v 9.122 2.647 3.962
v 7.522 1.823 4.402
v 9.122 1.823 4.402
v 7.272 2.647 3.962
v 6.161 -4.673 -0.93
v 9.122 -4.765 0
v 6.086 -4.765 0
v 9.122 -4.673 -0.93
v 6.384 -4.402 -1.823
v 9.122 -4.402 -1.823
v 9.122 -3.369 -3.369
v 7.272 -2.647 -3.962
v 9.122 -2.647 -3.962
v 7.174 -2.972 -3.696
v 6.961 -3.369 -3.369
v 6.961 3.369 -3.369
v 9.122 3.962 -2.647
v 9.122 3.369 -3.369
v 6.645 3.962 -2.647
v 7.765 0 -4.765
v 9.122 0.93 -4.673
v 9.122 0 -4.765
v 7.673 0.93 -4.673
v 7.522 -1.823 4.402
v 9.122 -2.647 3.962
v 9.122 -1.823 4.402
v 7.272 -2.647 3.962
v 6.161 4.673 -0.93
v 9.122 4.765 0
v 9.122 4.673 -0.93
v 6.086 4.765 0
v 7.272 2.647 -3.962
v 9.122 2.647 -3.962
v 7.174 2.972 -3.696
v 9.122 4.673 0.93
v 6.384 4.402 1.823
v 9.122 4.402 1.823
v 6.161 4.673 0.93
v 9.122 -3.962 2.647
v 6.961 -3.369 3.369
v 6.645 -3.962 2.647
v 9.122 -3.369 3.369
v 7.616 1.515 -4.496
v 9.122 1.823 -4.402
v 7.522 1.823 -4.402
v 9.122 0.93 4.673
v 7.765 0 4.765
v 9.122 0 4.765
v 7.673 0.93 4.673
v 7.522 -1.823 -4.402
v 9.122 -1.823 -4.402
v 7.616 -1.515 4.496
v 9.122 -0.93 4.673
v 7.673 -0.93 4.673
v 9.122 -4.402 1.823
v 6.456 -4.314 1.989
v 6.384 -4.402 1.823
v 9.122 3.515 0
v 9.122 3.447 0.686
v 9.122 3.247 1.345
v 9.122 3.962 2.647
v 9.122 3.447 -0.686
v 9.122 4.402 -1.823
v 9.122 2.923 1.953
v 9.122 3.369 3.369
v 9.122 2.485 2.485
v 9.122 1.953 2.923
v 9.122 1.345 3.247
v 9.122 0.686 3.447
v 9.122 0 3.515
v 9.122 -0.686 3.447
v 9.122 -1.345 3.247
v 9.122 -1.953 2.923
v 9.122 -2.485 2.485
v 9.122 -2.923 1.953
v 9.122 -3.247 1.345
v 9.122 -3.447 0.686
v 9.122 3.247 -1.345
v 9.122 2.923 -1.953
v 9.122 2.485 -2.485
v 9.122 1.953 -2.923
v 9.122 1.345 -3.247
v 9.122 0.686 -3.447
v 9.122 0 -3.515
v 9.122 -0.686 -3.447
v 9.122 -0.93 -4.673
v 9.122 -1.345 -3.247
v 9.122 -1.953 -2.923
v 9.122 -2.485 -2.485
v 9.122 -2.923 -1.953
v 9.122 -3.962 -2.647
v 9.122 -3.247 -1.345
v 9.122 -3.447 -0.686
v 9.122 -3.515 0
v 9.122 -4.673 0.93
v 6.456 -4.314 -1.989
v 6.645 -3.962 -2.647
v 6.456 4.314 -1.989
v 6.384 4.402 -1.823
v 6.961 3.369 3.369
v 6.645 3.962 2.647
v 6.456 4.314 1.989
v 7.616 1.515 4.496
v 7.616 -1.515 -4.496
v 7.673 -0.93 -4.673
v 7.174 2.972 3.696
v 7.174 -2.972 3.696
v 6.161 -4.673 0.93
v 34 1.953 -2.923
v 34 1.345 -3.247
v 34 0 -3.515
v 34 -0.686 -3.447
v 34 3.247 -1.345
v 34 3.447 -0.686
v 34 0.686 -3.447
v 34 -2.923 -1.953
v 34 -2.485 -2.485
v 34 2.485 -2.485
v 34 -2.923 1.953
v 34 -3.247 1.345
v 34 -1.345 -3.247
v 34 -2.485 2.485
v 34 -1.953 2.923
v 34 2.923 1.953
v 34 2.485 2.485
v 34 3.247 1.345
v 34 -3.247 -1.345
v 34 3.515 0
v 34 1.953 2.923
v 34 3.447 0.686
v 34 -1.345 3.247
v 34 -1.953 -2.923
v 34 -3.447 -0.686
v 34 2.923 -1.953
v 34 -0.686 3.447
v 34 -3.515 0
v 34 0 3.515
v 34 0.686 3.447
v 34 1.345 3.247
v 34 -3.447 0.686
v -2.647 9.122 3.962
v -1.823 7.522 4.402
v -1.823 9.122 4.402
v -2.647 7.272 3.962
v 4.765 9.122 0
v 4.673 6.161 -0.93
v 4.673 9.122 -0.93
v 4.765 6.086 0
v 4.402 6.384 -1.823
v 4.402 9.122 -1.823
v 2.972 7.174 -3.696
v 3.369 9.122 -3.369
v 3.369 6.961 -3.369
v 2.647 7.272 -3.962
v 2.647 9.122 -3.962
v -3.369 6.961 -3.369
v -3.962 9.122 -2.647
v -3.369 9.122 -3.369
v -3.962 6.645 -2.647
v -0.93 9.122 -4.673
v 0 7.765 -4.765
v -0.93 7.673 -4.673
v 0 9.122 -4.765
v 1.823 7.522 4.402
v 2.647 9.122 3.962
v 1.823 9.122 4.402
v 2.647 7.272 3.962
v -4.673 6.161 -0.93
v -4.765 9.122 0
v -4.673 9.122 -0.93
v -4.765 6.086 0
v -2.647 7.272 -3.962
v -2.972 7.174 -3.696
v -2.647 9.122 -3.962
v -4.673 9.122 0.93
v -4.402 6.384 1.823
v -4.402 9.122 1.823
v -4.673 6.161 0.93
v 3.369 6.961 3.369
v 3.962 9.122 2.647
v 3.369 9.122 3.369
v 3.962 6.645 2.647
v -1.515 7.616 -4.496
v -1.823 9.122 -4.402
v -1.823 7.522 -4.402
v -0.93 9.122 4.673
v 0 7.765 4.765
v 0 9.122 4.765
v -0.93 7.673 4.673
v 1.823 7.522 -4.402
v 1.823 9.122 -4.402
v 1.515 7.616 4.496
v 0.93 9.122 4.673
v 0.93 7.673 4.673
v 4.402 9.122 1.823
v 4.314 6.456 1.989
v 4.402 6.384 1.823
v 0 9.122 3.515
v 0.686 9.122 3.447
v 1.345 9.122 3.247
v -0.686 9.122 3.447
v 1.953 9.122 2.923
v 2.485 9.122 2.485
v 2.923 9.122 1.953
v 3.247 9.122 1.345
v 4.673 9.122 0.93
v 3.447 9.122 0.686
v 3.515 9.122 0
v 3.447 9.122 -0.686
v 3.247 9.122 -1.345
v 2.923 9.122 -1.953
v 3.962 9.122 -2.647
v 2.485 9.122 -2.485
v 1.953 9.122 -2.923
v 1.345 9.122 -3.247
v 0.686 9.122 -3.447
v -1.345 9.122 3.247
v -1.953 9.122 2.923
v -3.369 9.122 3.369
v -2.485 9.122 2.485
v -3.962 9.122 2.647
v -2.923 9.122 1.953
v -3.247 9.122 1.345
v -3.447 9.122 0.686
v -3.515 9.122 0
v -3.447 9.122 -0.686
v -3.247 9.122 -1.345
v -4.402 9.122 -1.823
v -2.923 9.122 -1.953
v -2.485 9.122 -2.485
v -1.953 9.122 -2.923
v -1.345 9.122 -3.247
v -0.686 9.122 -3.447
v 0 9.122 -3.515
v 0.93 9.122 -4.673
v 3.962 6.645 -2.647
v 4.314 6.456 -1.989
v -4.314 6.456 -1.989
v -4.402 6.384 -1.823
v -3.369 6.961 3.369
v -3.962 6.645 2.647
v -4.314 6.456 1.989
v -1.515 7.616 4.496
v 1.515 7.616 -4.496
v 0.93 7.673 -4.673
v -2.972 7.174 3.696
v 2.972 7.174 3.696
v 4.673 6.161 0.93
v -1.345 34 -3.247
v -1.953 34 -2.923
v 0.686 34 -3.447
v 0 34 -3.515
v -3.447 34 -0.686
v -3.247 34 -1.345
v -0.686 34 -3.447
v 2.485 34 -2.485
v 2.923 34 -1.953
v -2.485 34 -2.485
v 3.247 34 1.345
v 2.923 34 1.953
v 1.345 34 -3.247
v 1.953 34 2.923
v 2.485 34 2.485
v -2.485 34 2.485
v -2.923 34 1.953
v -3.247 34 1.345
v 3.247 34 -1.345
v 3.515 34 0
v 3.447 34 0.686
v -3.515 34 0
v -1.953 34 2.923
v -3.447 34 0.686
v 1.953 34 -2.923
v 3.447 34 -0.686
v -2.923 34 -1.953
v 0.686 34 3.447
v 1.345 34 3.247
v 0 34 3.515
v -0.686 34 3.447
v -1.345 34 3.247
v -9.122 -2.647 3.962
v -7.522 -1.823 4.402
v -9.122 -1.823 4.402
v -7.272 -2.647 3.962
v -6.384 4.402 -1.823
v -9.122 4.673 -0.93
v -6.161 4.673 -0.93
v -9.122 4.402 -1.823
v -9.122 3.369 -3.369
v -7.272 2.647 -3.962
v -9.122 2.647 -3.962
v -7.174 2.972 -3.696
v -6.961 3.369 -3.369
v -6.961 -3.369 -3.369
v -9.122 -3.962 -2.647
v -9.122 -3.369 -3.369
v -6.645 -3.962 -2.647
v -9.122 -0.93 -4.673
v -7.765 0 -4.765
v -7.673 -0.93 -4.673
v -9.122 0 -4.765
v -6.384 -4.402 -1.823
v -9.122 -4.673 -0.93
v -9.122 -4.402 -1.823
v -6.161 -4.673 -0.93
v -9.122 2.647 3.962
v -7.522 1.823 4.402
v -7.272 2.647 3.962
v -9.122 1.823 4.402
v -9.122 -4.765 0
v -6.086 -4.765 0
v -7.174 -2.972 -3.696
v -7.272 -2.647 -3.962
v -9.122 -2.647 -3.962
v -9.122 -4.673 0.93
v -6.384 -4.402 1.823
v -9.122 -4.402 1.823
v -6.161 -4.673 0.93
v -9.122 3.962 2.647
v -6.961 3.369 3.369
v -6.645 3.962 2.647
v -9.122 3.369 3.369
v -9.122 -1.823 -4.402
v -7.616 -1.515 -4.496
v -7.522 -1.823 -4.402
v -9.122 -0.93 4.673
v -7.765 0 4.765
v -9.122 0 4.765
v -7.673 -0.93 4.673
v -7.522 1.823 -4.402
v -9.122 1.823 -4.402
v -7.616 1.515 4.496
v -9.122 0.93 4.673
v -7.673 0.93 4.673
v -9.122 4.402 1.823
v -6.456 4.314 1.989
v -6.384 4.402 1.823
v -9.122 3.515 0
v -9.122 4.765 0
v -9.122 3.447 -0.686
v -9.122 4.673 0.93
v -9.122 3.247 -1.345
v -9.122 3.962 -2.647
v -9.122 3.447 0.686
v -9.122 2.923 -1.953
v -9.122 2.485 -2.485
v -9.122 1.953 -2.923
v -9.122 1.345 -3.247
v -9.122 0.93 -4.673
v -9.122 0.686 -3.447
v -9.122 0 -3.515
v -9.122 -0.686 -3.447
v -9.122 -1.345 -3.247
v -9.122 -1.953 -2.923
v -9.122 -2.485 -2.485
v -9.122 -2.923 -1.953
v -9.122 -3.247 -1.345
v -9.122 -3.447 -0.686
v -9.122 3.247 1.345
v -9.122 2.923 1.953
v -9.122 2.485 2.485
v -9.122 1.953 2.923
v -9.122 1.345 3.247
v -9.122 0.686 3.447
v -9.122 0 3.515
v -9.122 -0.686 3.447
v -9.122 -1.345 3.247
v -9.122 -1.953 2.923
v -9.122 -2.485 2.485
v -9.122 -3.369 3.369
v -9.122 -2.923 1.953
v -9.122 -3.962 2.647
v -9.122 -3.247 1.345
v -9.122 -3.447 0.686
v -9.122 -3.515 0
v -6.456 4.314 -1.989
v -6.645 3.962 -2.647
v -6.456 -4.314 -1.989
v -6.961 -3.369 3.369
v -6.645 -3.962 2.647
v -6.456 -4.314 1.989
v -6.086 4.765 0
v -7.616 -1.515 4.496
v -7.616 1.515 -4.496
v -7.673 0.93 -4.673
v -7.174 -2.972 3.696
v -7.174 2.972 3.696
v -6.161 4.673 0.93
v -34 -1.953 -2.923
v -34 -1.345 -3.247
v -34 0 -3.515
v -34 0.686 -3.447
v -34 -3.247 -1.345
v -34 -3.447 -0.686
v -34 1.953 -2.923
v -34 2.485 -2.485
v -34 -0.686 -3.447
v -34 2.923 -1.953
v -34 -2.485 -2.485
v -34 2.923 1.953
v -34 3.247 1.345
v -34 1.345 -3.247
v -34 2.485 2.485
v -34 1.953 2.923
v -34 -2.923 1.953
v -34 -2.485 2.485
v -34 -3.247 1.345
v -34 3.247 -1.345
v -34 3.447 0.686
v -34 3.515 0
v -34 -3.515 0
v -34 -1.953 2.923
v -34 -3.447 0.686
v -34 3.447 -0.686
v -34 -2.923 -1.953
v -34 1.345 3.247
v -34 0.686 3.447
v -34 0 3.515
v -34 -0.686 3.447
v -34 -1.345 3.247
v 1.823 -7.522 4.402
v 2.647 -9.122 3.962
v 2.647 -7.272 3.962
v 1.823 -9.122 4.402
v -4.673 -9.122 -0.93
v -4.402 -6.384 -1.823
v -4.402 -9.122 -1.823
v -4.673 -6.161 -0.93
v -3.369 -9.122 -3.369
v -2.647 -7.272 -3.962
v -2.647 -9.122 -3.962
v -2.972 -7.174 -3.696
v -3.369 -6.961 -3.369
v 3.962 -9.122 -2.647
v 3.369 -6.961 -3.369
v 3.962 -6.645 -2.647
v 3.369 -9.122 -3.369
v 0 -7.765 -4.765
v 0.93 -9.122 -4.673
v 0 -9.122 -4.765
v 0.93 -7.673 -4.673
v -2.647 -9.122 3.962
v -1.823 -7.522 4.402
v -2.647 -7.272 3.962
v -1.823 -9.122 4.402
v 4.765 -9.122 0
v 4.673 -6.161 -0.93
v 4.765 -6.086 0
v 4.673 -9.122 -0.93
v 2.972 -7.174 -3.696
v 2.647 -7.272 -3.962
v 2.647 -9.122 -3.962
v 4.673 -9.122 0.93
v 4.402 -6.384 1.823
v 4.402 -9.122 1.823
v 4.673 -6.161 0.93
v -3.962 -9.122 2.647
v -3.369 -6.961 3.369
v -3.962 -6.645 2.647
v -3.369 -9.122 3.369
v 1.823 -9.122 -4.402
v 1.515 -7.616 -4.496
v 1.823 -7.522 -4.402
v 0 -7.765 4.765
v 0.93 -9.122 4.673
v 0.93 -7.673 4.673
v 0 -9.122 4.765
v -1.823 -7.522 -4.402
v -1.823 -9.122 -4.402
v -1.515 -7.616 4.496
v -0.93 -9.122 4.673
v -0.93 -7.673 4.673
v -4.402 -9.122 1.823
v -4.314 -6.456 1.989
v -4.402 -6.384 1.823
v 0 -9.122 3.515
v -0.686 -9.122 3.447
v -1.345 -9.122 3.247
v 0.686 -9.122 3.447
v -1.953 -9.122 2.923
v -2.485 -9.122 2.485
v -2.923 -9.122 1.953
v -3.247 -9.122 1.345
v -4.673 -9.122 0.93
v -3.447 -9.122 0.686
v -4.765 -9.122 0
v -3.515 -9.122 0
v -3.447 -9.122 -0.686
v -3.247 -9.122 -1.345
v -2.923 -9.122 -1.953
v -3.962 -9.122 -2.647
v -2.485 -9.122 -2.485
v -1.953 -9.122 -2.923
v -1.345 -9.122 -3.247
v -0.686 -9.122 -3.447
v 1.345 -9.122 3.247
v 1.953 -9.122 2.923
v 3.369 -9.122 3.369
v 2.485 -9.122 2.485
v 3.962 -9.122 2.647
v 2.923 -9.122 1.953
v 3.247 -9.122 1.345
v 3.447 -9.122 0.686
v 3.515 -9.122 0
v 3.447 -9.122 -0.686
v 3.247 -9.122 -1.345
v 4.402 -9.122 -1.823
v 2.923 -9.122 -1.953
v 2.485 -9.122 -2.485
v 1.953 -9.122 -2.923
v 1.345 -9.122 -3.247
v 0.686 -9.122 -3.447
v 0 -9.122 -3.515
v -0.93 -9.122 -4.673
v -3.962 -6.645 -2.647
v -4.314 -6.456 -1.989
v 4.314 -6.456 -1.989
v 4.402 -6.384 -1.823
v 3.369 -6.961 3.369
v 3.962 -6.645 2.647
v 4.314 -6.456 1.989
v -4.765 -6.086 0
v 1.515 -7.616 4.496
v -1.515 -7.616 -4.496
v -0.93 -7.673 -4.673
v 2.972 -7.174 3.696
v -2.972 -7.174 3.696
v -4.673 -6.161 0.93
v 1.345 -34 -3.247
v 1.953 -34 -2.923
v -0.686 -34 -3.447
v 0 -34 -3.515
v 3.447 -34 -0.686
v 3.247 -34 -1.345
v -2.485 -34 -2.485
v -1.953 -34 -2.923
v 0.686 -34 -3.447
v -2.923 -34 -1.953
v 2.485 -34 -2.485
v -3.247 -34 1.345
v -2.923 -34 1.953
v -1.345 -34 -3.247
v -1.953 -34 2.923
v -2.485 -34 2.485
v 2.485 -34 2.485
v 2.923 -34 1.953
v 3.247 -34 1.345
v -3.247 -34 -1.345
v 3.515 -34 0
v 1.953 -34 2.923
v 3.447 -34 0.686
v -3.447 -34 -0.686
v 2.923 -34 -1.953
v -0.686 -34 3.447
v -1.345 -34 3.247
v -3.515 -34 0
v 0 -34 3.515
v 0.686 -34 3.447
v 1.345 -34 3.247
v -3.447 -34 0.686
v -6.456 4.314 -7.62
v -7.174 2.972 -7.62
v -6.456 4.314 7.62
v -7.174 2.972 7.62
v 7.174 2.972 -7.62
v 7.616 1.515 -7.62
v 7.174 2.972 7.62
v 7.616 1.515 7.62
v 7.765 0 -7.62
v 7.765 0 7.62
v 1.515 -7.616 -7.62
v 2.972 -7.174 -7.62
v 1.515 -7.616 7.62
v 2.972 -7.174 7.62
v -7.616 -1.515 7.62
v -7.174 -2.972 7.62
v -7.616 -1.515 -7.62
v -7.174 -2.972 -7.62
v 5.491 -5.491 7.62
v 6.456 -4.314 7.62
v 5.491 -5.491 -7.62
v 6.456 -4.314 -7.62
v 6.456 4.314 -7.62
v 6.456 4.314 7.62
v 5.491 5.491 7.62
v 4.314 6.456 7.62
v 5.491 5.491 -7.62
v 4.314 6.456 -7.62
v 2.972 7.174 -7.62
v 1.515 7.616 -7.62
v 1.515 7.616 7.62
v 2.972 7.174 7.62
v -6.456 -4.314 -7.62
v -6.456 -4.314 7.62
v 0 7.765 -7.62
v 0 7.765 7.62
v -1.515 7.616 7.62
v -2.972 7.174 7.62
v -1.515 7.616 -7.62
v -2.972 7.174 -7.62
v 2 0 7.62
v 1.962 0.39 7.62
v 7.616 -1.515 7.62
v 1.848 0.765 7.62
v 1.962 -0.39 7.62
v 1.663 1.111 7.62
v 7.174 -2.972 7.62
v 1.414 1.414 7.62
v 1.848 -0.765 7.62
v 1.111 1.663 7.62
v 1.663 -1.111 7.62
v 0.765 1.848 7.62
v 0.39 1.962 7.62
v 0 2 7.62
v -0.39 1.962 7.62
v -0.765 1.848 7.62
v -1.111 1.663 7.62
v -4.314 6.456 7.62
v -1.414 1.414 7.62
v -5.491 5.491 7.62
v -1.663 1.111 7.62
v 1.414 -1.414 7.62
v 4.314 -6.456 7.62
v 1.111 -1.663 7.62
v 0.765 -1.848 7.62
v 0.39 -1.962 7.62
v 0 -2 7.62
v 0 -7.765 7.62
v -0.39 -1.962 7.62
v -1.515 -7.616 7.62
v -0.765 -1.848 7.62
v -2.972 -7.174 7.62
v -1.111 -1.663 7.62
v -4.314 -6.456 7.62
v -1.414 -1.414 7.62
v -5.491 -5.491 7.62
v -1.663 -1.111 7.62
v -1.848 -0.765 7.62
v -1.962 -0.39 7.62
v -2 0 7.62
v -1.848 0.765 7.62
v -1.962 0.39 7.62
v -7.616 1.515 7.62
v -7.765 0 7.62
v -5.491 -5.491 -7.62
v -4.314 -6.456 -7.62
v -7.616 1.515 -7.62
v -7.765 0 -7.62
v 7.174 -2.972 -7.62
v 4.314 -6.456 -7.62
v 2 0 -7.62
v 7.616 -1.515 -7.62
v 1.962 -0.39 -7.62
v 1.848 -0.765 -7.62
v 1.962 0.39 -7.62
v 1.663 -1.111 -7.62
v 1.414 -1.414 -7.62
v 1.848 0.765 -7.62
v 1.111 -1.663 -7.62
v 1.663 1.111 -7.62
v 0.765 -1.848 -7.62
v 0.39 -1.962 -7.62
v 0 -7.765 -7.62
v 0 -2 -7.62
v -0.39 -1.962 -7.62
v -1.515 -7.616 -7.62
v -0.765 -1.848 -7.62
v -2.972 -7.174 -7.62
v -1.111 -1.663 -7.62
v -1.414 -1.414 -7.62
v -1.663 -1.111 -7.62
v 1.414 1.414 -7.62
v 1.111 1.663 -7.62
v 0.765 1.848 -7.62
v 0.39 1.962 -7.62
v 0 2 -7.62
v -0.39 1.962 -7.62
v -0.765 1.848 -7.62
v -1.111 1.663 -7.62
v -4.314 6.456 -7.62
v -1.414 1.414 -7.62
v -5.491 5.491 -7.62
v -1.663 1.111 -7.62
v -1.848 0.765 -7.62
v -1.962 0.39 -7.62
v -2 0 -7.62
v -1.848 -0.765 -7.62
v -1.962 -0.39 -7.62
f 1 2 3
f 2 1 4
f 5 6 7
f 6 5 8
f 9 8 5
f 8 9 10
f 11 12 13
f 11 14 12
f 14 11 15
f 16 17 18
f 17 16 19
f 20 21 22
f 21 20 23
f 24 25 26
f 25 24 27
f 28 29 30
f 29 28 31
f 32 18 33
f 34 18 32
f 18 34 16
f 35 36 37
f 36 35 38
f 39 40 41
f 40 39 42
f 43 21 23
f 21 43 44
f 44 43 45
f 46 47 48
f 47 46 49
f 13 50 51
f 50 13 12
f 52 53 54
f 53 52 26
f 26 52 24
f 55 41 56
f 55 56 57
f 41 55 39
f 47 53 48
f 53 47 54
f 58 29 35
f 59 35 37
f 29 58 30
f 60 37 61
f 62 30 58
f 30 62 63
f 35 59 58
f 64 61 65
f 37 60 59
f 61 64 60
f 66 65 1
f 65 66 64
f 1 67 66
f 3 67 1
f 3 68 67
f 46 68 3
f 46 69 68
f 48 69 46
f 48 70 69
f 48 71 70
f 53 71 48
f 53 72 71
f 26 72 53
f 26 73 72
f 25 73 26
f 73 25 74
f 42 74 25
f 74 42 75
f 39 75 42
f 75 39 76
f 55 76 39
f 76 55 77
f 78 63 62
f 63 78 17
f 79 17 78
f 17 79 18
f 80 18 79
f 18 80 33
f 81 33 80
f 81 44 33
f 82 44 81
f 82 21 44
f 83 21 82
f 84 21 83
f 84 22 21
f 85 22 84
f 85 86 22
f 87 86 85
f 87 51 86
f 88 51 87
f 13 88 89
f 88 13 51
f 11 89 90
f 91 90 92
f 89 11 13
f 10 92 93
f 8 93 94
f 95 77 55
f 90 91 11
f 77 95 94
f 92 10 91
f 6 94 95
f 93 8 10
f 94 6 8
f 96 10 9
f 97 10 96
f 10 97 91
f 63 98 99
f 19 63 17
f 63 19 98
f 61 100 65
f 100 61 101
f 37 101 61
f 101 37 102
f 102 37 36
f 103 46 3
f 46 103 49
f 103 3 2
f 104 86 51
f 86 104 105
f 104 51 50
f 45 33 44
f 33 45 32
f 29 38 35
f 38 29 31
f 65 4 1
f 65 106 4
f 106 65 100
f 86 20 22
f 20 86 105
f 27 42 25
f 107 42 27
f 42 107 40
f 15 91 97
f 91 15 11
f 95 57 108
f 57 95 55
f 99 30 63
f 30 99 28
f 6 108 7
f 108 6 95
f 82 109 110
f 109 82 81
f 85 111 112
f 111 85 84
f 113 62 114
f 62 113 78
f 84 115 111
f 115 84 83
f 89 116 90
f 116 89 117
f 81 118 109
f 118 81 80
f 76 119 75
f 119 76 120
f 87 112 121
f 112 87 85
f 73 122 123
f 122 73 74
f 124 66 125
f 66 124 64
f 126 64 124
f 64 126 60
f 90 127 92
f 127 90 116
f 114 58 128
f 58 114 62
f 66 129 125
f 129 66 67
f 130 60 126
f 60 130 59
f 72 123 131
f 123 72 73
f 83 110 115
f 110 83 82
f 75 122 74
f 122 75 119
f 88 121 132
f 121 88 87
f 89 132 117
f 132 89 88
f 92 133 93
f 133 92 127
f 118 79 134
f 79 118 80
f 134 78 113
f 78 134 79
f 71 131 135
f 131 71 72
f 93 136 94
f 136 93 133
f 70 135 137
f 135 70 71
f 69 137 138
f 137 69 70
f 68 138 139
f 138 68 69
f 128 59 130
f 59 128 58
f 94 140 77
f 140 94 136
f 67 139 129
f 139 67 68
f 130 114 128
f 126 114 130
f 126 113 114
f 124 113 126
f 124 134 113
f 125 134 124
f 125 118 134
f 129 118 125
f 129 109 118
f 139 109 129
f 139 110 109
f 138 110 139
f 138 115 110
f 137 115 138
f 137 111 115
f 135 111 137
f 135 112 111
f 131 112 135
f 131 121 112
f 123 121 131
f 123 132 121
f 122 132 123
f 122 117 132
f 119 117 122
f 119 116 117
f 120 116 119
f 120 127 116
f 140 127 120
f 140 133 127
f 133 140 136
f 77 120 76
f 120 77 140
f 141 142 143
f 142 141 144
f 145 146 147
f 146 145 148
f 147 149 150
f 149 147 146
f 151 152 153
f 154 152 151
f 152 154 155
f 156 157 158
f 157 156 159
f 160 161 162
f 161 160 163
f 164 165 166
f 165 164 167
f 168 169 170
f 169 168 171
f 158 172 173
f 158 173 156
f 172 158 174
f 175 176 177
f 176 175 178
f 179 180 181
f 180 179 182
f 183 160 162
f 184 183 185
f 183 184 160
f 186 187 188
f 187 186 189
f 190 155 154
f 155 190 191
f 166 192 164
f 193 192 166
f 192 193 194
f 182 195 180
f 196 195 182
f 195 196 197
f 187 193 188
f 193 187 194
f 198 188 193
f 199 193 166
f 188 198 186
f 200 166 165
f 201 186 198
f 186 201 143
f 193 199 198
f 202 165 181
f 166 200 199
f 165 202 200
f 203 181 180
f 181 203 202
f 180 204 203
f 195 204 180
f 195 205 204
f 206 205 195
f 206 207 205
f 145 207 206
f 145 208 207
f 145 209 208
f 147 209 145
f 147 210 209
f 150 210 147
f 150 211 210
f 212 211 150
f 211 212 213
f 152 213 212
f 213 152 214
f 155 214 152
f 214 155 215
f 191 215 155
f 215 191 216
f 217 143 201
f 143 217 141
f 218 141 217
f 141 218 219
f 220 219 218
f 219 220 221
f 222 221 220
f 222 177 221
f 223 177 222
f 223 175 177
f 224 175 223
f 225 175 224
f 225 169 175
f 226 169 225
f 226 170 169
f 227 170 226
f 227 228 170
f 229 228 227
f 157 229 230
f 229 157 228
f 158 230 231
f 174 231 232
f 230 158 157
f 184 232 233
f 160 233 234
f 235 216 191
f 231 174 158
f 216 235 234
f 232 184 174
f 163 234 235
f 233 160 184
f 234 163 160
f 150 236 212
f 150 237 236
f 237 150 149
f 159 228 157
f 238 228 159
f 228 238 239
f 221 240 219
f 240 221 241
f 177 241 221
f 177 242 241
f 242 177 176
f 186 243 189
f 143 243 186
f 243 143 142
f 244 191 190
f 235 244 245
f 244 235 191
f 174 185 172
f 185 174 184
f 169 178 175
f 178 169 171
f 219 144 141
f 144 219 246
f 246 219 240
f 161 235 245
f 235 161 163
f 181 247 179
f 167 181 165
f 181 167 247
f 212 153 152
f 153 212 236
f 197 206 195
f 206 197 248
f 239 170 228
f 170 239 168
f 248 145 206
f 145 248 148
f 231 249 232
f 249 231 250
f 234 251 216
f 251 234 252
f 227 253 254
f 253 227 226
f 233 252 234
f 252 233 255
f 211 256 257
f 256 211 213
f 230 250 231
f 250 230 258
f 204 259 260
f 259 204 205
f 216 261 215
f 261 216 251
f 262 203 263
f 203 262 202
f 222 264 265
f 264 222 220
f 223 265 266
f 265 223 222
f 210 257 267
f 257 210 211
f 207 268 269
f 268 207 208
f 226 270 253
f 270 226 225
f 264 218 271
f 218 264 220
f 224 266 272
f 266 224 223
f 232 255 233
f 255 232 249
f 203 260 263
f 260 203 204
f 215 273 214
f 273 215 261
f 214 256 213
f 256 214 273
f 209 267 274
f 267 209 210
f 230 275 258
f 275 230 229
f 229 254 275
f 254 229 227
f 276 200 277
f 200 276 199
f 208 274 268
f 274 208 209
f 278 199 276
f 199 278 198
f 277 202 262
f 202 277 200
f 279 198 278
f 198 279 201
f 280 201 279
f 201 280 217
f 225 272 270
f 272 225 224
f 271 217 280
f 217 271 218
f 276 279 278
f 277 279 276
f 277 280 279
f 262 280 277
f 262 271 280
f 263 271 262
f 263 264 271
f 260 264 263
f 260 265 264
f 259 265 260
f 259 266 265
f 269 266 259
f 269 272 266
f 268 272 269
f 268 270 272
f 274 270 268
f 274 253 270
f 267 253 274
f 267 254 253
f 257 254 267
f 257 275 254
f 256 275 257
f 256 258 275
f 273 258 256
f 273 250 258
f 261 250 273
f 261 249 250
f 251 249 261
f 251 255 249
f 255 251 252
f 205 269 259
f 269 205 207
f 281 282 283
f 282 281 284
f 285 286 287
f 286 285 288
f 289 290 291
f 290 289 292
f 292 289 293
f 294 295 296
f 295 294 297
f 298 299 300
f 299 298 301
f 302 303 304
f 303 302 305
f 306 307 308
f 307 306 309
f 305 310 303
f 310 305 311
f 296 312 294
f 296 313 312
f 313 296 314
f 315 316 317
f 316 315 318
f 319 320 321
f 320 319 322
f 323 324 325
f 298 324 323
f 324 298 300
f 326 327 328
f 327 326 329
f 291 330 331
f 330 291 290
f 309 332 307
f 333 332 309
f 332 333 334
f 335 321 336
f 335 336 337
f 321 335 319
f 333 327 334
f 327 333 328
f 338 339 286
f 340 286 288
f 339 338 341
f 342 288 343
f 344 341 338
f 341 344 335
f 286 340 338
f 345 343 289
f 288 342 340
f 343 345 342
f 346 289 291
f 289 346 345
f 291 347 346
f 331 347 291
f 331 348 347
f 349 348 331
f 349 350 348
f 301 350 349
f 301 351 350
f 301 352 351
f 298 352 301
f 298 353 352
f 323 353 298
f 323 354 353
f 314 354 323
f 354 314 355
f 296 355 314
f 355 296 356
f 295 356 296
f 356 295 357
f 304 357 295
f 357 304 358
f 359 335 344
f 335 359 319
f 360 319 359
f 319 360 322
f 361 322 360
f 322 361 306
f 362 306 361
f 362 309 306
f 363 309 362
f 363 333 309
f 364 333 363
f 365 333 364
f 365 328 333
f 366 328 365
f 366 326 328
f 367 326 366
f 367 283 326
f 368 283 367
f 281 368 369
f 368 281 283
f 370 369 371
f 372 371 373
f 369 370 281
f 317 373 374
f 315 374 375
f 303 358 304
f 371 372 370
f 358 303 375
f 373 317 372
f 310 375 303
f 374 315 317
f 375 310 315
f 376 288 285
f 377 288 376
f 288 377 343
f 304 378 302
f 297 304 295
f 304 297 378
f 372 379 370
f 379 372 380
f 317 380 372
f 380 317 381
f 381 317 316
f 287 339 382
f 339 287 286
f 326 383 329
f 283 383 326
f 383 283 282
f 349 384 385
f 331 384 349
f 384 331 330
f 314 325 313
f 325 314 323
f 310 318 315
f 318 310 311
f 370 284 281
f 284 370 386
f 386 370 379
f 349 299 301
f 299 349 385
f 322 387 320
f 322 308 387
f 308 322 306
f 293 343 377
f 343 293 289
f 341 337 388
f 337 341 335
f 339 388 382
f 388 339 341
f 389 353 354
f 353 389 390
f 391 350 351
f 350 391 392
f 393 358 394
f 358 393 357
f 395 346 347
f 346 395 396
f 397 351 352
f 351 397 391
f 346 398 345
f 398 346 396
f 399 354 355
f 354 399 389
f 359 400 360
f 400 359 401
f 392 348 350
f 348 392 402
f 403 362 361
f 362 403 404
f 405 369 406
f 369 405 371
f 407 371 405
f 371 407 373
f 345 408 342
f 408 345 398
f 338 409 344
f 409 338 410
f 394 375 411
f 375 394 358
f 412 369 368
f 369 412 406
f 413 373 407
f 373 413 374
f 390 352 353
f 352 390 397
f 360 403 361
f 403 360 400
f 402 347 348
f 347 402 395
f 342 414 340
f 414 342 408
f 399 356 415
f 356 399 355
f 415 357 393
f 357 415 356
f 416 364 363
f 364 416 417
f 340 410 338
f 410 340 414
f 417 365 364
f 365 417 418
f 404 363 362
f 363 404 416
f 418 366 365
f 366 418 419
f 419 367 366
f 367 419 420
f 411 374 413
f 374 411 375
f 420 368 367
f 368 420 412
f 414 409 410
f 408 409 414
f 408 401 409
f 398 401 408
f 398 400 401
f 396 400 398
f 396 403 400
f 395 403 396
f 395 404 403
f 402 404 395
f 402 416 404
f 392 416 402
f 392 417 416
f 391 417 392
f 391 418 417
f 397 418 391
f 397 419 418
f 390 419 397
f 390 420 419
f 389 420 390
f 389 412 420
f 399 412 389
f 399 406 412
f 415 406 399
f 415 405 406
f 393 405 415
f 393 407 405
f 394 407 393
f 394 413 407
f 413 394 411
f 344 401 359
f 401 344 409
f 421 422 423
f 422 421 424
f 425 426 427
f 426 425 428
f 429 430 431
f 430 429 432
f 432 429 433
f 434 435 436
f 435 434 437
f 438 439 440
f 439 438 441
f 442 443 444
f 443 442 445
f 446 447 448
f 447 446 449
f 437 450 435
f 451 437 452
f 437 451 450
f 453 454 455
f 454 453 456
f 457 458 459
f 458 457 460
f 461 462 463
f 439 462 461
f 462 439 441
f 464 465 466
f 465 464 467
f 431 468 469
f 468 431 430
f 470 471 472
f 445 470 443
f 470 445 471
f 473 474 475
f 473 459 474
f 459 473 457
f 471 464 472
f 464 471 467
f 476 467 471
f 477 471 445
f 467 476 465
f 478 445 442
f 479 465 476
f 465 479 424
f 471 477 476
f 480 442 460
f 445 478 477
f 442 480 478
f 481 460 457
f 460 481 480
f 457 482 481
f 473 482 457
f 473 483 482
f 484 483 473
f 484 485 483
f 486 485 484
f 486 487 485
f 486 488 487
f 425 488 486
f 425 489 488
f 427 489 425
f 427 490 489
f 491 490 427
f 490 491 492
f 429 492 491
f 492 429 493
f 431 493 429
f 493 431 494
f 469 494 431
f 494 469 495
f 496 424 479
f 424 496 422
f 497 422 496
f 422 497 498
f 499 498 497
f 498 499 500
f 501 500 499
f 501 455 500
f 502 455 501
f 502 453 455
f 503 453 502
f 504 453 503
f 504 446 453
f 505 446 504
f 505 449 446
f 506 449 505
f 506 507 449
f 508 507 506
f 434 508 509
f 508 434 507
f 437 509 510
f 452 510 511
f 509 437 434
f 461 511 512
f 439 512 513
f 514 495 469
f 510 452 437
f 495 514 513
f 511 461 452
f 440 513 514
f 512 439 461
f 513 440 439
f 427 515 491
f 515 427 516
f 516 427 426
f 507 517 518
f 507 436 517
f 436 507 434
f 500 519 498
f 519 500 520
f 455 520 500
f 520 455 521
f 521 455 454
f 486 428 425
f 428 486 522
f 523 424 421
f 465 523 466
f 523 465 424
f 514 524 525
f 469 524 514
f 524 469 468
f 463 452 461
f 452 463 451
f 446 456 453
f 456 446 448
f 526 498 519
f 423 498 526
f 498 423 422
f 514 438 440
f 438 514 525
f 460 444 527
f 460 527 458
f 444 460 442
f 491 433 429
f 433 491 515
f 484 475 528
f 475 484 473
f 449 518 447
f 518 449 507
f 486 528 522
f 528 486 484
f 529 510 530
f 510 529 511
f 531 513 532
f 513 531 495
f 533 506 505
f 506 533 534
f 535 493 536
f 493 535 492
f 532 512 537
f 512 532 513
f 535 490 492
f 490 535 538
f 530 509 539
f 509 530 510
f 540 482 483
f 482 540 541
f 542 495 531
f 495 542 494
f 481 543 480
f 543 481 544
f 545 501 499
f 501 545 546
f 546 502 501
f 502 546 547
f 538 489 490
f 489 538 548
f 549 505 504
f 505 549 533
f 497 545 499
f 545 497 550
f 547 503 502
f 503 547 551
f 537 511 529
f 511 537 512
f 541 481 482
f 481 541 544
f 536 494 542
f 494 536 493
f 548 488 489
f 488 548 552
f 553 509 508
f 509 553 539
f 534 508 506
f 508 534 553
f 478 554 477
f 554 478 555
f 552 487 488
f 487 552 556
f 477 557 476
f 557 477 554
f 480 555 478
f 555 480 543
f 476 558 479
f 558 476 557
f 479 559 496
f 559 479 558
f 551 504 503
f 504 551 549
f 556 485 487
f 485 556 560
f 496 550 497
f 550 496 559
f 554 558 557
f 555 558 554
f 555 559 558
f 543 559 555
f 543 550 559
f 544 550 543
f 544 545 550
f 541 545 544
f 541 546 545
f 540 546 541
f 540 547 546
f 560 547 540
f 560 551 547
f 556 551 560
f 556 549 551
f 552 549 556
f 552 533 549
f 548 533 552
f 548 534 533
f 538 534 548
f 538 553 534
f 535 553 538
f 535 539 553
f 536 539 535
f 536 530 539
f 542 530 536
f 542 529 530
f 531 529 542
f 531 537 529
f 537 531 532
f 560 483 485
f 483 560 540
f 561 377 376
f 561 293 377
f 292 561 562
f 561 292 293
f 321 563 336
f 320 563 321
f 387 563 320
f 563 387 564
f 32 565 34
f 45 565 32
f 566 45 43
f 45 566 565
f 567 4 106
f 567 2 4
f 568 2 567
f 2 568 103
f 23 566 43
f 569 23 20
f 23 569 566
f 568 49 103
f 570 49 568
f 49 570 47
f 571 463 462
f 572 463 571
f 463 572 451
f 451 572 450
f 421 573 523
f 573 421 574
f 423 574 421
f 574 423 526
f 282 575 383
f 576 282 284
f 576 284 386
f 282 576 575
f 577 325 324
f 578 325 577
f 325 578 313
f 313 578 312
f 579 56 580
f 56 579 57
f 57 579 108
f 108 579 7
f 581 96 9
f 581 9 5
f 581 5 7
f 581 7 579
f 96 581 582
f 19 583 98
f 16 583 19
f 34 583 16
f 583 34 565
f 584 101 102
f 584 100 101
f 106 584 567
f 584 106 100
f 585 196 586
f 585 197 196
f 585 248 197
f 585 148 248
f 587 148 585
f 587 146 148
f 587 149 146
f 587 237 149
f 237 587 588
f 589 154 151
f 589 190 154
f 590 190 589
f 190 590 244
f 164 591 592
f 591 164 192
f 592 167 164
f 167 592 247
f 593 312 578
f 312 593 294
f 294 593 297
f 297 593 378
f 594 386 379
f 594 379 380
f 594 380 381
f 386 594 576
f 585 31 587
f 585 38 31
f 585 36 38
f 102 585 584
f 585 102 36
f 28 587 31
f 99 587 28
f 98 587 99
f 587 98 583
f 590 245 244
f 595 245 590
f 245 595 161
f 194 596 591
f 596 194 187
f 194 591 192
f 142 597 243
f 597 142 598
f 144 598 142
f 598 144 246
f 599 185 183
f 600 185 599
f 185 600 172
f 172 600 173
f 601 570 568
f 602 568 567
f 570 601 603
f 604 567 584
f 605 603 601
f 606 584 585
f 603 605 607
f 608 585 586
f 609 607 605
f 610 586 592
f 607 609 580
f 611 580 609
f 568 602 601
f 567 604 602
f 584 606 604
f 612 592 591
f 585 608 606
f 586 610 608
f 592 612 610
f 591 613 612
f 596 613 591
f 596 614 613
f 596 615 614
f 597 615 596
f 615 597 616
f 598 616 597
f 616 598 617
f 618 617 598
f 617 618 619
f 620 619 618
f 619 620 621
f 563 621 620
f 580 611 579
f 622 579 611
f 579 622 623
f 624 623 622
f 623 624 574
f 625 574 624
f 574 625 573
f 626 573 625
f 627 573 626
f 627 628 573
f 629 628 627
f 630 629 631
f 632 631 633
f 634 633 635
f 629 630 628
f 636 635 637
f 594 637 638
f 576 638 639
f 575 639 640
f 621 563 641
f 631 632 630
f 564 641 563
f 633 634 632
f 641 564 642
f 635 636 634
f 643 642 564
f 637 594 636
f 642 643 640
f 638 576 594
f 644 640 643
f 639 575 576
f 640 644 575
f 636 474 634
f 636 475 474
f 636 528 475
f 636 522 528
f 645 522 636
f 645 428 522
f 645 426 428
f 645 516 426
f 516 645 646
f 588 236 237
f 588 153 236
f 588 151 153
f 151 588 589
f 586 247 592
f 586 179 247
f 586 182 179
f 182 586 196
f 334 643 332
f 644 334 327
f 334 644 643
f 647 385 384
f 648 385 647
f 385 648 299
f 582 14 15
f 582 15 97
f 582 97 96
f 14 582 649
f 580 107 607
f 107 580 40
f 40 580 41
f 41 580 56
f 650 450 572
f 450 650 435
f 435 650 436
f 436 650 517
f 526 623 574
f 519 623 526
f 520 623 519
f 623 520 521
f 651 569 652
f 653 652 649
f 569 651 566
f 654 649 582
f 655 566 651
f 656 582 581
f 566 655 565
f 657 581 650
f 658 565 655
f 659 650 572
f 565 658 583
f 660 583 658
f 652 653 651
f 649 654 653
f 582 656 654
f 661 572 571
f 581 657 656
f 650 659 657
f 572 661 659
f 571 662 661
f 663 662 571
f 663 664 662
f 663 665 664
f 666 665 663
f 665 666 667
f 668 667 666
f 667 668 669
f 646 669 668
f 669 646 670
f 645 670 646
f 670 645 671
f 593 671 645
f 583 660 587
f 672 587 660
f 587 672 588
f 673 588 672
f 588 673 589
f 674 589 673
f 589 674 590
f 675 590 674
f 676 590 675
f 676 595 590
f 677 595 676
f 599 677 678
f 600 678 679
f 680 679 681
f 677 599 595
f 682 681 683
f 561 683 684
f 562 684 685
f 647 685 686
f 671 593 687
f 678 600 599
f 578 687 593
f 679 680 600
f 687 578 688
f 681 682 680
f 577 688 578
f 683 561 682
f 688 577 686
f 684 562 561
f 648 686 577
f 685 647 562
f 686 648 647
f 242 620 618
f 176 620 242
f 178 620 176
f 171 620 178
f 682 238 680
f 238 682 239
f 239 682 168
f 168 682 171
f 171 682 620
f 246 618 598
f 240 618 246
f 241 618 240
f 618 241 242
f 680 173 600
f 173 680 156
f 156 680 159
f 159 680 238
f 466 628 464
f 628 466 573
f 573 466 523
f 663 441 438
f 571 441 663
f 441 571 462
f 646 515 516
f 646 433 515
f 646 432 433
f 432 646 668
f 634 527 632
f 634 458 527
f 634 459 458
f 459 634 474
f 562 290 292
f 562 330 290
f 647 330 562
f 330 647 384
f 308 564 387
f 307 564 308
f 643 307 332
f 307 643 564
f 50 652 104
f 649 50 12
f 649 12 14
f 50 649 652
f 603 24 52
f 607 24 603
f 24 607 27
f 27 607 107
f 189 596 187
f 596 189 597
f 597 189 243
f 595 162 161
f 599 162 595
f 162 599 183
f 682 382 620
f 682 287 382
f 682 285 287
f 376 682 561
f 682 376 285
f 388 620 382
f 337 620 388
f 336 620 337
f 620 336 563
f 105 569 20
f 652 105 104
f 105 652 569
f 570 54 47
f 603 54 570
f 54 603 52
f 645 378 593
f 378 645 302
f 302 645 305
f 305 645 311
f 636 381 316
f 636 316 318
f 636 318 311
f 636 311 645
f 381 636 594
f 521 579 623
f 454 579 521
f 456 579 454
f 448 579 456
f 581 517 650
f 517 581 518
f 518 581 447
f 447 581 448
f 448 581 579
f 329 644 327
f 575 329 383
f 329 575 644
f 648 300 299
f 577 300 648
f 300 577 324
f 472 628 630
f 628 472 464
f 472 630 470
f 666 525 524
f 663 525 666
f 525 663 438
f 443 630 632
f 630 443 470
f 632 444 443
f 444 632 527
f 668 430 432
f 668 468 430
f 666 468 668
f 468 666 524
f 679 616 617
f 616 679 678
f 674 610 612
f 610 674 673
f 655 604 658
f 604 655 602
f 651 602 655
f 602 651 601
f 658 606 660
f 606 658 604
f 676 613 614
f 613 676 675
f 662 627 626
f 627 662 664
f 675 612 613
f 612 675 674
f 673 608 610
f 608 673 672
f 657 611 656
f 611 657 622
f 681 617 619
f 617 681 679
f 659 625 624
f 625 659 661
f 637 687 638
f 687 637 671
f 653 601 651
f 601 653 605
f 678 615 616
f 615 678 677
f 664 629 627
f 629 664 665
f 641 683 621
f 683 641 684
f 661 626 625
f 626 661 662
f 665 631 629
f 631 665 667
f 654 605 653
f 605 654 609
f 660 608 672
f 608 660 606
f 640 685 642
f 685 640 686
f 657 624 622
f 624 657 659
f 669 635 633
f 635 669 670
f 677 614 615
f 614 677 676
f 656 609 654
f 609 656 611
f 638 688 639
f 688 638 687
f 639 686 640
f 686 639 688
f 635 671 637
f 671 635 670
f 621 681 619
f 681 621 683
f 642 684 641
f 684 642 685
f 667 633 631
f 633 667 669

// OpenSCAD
$fn = 32;

// ----------------------------------------------------------------------
// Cardan cross: 68 mm span, 9.53 mm trunnions
// ----------------------------------------------------------------------

// --- parameters (mm) ---
journal_d = 9.53;         // trunnion diameter
arm_len = 34;             // trunnion length from the centre
step_r = 3.24;            // step position from the centre
step_d = 7.03;            // journal diameter after the step
hub_d = 15.53;            // hub diameter
hub_h = 15.24;            // hub height
bore_d = 4;               // hub bore

difference() {
  union() {
    /* hub along the joint axis */
    cylinder(h = hub_h, d = hub_d, center = true);
    for (a = [0 : 90 : 270]) rotate([0, 0, a]) {
      /* trunnion, sunk into the hub */
      translate([hub_d / 4, 0, 0]) rotate([0, 90, 0]) cylinder(h = step_r + 2, d = journal_d);
      /* stepped journal out to the tip */
      translate([step_r - 0.5, 0, 0]) rotate([0, 90, 0]) cylinder(h = arm_len + 0.5 - step_r, d = step_d);
    }
  }
  /* lubrication bore through the hub, 2.5 mm clear on both sides */
  translate([0, 0, -hub_h / 2 - 2.5]) cylinder(h = hub_h + 5, d = bore_d);
}
